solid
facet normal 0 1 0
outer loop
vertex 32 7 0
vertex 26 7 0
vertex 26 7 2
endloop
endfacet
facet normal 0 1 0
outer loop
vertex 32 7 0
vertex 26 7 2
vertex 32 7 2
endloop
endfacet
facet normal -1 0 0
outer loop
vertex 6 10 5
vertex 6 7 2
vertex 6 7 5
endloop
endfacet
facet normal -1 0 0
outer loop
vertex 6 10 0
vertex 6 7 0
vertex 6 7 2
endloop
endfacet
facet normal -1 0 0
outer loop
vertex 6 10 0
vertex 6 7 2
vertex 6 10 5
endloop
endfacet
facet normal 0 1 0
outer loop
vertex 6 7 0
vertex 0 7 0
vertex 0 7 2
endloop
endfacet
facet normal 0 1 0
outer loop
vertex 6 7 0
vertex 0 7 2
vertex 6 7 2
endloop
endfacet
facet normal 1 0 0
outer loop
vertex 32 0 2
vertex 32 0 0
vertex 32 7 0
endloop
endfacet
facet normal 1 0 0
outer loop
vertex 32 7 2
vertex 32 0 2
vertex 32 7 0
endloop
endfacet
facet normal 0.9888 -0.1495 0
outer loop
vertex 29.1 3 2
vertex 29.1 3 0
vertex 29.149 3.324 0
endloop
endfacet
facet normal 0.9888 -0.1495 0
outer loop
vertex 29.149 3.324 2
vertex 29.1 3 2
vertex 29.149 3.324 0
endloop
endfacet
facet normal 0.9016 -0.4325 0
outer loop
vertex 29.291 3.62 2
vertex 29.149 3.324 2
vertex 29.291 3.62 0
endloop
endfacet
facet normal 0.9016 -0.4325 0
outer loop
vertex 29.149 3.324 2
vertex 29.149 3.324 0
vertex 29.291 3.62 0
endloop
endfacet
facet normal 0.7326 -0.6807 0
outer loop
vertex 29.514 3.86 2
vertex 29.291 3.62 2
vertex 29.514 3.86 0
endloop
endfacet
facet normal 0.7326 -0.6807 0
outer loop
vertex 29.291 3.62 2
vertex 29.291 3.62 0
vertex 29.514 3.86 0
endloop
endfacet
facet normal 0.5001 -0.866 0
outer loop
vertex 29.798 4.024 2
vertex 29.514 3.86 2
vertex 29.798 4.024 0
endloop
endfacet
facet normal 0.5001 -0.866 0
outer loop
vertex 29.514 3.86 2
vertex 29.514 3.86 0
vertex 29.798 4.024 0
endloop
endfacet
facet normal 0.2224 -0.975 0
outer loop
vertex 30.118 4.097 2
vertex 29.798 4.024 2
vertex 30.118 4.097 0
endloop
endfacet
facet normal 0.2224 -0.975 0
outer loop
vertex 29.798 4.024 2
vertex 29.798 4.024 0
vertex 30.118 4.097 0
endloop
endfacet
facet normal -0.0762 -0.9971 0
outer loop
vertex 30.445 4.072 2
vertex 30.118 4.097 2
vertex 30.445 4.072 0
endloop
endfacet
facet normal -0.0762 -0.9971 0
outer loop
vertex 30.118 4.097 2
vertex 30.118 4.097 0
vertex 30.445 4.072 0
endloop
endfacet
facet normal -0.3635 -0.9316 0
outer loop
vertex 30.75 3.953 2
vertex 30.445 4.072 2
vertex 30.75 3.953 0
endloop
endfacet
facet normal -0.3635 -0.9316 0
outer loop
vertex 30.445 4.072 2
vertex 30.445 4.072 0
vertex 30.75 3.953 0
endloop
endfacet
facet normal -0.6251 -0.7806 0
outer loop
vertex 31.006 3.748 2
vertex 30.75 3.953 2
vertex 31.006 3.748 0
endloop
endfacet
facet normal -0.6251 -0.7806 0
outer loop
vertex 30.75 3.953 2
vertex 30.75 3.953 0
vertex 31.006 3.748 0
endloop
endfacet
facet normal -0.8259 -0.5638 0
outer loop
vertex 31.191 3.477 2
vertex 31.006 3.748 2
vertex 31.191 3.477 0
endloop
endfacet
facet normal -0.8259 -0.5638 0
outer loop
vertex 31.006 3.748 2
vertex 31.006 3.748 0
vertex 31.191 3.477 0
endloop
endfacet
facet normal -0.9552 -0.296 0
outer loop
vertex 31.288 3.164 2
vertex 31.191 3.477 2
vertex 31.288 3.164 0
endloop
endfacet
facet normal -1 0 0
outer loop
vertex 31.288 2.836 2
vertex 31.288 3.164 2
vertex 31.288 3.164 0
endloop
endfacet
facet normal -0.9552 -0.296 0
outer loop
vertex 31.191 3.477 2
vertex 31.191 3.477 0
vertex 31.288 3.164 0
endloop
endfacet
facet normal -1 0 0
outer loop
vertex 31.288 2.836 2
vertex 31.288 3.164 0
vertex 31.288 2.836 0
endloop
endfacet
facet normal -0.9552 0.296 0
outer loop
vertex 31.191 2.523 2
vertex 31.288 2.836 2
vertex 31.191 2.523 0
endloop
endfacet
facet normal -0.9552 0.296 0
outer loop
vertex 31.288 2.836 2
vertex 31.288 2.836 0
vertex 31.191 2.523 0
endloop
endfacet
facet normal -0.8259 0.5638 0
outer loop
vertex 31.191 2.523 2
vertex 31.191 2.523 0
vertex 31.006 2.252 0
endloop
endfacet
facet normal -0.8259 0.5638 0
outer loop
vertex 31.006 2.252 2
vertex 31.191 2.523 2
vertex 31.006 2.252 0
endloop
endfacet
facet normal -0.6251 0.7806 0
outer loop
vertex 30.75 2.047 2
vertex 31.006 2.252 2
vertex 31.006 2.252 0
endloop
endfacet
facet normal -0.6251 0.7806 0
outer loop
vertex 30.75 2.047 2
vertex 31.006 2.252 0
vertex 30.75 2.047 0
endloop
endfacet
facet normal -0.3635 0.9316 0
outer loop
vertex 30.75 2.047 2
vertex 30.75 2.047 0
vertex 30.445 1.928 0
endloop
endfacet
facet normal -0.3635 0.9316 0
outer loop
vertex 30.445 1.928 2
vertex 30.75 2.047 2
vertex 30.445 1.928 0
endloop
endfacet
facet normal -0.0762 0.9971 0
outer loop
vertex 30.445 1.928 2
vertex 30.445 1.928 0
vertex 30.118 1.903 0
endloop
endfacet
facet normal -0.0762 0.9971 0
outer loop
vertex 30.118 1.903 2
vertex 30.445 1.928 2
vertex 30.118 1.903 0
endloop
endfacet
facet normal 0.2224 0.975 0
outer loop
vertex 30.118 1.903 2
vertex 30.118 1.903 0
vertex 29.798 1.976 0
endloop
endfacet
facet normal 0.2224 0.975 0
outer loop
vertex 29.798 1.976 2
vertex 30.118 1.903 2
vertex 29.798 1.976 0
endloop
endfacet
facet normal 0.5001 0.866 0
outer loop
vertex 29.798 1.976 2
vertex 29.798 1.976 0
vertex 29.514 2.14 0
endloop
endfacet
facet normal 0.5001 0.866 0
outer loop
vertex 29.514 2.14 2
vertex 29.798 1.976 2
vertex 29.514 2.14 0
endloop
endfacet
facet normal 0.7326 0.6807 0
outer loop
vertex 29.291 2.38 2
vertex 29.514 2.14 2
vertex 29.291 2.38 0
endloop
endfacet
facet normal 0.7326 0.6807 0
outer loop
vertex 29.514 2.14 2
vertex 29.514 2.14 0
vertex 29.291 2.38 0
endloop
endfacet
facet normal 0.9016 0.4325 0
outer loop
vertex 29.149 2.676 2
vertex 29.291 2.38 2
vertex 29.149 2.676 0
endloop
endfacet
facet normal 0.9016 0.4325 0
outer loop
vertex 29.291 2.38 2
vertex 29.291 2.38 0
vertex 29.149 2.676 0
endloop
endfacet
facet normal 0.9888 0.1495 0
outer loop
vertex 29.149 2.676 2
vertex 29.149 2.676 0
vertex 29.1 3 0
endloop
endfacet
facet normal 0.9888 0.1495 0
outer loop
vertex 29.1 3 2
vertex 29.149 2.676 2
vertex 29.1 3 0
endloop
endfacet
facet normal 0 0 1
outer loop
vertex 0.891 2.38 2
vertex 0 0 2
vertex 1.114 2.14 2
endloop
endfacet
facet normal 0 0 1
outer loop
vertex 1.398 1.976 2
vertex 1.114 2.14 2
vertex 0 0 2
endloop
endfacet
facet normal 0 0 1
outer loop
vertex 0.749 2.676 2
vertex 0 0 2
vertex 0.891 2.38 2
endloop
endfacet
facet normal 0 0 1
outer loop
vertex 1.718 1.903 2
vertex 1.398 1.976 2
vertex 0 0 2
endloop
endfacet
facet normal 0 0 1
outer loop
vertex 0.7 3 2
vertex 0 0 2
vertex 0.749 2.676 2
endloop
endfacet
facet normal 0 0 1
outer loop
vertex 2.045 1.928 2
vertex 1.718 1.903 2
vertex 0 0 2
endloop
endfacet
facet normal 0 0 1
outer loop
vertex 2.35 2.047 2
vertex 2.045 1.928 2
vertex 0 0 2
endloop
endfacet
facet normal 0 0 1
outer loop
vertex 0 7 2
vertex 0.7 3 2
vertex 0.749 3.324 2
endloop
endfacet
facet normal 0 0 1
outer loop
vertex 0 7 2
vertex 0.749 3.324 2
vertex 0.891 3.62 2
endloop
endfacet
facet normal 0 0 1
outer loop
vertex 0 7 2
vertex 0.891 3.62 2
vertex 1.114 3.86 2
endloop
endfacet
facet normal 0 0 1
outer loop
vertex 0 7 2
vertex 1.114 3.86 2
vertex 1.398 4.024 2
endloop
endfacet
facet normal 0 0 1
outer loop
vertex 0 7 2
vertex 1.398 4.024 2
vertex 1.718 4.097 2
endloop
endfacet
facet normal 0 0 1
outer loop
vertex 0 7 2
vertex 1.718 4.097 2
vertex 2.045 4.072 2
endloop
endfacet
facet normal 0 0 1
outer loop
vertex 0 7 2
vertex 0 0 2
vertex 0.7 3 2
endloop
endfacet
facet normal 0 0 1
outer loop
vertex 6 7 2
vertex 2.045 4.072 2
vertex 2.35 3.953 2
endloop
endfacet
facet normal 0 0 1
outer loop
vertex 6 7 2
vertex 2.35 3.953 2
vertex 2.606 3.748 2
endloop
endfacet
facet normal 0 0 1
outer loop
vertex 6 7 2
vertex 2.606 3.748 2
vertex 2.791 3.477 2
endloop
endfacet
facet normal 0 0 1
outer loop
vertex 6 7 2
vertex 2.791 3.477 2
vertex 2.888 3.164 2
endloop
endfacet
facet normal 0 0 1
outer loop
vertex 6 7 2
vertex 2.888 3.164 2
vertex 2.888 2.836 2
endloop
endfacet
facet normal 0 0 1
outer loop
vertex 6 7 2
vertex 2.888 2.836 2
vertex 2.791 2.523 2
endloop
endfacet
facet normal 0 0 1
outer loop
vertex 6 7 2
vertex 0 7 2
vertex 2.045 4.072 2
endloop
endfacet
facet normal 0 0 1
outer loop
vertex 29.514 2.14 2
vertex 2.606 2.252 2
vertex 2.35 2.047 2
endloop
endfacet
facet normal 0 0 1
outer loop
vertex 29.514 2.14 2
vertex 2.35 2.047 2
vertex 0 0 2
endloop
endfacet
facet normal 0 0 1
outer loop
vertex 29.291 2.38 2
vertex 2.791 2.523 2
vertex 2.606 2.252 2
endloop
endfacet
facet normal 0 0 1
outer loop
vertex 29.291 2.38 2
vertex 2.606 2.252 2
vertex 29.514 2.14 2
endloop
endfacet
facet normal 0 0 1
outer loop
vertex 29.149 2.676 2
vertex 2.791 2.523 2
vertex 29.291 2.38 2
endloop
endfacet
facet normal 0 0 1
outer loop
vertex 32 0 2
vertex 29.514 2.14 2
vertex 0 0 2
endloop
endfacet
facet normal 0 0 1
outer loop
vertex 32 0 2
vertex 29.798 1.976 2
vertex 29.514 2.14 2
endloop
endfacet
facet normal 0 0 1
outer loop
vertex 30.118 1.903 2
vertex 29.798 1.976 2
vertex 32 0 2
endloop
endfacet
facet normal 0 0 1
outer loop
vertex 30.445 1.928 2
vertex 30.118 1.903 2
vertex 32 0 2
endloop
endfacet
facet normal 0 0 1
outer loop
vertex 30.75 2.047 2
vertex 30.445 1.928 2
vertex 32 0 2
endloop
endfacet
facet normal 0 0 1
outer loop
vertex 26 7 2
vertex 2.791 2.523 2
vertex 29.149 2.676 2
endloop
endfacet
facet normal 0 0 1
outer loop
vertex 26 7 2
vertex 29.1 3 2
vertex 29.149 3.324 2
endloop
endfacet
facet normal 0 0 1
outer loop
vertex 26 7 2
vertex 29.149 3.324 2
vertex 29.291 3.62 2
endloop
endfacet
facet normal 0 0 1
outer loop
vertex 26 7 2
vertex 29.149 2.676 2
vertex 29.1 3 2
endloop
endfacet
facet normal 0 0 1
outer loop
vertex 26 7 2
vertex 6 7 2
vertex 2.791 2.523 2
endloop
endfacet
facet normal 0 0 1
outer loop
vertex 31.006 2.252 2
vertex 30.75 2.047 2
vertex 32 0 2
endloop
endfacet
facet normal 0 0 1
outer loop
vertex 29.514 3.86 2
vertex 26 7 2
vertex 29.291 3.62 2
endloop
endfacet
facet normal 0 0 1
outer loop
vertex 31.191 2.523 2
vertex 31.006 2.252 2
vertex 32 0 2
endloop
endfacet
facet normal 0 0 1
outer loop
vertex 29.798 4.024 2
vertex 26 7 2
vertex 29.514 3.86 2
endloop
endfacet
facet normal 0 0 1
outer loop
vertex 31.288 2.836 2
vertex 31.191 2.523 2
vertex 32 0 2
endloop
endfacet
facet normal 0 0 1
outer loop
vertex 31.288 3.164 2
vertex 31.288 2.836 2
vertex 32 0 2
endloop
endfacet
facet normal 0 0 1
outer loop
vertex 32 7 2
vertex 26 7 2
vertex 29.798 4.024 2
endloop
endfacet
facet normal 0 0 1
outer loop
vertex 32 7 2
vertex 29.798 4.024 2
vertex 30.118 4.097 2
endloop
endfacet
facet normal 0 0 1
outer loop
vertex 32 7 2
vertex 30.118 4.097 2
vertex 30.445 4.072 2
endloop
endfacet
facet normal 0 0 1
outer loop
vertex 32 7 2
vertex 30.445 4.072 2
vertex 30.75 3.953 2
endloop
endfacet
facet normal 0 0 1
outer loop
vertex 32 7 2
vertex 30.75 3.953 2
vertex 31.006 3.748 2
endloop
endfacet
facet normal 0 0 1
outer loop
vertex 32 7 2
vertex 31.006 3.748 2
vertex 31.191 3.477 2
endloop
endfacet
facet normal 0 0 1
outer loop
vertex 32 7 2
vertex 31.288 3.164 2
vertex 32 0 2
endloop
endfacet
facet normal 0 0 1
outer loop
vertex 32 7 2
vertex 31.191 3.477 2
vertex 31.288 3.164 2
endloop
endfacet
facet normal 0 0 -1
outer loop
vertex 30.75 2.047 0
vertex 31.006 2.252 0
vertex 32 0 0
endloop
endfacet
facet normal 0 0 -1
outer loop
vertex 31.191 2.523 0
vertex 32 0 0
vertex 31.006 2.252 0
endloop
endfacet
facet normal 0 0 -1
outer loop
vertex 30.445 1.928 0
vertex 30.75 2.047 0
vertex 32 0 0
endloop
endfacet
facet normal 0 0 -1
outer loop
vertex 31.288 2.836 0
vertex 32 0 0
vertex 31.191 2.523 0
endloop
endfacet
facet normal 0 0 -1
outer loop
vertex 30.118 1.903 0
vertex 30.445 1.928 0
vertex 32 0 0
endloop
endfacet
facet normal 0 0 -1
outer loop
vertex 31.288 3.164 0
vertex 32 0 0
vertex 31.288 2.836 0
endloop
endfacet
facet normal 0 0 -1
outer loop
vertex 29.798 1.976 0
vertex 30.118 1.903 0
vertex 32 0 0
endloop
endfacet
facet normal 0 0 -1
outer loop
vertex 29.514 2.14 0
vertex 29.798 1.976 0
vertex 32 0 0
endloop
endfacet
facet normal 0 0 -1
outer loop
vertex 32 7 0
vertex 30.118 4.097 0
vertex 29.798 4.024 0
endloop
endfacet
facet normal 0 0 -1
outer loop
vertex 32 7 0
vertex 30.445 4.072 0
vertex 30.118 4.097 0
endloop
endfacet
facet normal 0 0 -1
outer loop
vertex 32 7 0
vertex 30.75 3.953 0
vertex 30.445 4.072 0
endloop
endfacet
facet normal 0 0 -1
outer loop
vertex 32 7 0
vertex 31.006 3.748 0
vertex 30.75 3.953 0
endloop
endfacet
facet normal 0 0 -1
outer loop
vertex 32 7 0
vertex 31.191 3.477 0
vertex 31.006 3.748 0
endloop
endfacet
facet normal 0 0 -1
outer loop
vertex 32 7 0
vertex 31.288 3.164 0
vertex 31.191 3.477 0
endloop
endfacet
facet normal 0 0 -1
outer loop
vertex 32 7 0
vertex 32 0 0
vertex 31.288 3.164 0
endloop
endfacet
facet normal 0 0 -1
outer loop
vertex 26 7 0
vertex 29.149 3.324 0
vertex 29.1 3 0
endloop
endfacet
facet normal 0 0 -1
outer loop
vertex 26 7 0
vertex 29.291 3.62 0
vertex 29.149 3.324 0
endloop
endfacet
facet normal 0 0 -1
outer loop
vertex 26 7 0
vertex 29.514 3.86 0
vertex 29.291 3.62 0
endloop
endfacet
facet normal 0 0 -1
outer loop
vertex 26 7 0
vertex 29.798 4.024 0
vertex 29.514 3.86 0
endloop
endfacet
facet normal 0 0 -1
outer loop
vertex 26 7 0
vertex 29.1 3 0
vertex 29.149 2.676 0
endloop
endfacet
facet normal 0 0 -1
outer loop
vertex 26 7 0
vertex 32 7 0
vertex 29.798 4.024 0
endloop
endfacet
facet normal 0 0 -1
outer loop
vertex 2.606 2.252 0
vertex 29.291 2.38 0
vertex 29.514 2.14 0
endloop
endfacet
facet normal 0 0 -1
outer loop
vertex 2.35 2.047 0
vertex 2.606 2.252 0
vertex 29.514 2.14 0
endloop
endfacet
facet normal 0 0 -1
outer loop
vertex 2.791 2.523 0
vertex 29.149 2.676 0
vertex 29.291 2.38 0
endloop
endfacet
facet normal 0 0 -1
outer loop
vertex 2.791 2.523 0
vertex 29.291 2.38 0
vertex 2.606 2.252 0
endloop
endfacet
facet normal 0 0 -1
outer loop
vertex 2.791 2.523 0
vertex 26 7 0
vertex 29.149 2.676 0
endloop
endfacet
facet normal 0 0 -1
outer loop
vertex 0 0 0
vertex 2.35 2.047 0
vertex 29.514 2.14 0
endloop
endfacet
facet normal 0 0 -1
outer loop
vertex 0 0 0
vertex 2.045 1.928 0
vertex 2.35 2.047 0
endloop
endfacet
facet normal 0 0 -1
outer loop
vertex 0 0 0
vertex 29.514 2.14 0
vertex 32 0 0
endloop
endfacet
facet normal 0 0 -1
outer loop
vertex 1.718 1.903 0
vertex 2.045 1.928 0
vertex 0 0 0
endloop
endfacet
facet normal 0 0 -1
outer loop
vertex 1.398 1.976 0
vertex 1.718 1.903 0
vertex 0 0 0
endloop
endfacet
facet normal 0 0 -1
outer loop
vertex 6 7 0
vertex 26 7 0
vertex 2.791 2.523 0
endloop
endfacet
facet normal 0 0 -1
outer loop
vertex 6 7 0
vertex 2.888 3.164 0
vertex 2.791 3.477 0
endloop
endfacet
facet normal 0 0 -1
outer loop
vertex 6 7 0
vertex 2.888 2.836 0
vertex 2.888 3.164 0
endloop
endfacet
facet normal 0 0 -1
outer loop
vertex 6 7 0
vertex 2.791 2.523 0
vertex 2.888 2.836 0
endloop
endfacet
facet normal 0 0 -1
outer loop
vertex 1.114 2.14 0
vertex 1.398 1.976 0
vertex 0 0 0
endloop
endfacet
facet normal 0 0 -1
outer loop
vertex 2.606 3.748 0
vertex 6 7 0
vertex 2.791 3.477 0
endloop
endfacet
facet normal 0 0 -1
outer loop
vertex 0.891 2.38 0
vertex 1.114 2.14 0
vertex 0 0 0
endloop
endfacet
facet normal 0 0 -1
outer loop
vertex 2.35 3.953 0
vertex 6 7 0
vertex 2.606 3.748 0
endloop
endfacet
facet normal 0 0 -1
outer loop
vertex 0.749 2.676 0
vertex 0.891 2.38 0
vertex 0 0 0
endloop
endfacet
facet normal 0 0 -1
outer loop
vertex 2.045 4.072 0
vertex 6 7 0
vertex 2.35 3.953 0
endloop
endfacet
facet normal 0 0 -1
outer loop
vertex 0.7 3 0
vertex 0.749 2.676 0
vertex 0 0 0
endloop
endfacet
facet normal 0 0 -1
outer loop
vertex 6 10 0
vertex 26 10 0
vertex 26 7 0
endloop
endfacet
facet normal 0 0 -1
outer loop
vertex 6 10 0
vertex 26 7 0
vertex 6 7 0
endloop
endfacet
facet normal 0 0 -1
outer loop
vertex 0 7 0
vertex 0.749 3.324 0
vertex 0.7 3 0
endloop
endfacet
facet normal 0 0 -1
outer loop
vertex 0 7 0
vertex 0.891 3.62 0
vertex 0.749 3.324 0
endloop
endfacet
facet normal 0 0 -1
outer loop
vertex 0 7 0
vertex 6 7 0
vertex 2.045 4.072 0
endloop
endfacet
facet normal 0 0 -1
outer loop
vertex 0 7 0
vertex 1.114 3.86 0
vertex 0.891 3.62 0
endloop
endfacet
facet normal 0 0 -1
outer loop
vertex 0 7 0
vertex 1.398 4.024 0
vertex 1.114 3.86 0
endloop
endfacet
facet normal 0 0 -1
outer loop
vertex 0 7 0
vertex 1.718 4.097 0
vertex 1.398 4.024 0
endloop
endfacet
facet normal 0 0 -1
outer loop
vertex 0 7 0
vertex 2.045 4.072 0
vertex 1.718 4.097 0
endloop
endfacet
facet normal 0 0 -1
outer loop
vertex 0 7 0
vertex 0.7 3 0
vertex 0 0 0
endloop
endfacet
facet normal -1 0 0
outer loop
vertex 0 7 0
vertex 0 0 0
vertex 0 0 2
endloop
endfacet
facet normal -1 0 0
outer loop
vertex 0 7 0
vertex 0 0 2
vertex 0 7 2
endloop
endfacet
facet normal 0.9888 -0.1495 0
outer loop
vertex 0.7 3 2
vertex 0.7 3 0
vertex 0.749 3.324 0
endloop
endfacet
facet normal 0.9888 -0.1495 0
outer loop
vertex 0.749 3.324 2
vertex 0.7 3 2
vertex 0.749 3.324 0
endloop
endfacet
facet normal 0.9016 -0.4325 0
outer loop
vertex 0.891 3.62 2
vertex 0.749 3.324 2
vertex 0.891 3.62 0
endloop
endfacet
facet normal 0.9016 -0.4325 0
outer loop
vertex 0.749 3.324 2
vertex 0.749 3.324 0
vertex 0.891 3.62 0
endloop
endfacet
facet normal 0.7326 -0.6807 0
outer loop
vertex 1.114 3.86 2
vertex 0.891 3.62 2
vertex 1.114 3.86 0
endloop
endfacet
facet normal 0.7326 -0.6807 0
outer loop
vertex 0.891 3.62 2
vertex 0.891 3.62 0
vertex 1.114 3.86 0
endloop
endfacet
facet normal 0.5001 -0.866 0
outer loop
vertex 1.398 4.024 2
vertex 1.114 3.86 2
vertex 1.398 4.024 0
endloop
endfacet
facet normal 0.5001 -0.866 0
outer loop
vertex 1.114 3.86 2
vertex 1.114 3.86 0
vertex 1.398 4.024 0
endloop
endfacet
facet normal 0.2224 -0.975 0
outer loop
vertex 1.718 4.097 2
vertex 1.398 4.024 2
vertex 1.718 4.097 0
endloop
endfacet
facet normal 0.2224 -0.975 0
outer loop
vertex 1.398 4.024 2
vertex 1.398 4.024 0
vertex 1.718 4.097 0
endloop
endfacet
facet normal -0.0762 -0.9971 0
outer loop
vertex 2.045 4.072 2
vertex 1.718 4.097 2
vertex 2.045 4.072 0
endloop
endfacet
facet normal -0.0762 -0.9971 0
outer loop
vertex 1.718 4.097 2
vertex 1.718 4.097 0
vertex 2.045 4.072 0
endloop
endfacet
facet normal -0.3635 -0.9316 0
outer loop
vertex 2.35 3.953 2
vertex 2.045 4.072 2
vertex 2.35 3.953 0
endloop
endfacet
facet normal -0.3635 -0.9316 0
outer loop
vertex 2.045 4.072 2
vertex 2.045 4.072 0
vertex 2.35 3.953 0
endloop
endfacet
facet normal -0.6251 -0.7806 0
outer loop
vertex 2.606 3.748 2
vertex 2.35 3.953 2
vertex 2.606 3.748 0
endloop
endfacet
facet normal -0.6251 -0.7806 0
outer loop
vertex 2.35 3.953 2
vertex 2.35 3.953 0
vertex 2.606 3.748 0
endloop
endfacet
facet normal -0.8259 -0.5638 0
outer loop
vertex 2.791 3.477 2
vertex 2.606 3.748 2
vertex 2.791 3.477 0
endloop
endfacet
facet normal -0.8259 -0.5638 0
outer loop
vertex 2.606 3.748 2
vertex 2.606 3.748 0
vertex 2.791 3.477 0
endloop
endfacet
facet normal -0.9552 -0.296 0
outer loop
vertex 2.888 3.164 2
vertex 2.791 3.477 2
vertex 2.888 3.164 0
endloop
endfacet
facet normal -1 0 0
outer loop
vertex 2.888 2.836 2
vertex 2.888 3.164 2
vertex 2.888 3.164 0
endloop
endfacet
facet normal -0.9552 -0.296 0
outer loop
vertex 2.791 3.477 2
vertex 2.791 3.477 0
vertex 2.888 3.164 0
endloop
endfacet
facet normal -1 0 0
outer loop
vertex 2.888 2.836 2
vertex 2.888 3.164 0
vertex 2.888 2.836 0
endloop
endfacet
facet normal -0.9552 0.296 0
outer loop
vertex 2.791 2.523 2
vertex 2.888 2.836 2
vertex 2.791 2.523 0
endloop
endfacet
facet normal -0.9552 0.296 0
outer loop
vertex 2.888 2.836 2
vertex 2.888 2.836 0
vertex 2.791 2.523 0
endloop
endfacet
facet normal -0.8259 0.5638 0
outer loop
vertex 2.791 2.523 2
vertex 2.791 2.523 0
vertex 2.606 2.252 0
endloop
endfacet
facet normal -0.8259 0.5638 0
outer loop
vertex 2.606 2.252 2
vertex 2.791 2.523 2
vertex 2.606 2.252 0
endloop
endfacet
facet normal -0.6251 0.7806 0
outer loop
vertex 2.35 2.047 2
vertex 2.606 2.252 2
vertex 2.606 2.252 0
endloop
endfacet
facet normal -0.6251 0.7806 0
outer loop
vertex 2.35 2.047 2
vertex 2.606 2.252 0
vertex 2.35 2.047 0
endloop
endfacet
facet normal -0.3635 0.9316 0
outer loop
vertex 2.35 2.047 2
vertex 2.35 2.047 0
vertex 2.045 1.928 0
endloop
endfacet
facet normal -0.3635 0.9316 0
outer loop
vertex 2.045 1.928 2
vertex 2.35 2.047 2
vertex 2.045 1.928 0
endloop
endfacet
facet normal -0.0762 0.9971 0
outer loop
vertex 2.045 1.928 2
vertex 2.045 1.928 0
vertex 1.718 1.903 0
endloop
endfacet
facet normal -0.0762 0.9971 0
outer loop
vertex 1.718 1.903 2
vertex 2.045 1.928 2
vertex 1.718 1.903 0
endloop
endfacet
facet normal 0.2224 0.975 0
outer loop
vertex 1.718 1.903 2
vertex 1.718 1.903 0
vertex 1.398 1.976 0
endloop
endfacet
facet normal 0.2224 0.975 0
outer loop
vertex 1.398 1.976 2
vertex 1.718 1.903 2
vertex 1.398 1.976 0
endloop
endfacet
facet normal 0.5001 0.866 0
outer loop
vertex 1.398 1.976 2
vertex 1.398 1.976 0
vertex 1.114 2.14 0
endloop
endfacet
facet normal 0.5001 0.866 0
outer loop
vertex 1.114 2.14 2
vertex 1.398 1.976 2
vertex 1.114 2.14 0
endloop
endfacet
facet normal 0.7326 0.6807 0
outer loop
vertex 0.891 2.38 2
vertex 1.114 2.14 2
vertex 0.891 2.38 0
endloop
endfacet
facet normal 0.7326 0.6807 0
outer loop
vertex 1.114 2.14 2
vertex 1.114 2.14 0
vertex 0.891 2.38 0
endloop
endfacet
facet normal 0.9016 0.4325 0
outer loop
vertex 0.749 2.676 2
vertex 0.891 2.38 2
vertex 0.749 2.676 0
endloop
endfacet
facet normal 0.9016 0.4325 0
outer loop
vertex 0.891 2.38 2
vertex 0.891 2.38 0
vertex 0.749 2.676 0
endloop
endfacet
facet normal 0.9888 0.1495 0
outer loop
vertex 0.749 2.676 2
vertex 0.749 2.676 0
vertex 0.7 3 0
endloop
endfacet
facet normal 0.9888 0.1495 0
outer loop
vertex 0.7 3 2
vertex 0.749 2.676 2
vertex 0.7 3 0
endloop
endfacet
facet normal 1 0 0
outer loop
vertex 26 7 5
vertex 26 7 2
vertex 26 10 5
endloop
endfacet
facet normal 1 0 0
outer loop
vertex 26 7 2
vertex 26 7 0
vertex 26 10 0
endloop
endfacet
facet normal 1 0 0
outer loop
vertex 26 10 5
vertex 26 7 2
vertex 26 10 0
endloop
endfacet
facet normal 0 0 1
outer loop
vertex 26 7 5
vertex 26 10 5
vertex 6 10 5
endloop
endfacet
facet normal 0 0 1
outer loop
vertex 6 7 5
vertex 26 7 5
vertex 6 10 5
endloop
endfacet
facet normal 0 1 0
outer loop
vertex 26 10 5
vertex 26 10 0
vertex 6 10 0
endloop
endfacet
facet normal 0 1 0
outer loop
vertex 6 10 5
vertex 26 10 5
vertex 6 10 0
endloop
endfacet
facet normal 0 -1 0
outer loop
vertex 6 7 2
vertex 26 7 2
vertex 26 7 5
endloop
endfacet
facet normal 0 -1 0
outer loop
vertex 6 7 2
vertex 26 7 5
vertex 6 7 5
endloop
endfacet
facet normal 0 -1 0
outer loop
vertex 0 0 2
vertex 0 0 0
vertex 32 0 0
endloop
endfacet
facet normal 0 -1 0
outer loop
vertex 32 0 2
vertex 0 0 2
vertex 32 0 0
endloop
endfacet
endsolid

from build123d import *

# Parameters (mm, degrees)
SKETCH_1_W          = 32
SKETCH_1_H          = 7
EXTRUDE_1_DEPTH     = 2
SKETCH_2_R          = 1.1
CUT_EXTRUDE_1_DEPTH = 2
SKETCH_3_W          = 20
SKETCH_3_H          = 3
EXTRUDE_2_DEPTH     = 5


with BuildPart() as part:
    # 草图1 → 凸台-拉伸1 (new body)
    with BuildSketch(Plane.XY):
        with Locations((16, 3.5)):
            Rectangle(SKETCH_1_W, SKETCH_1_H)
    extrude(amount=EXTRUDE_1_DEPTH)

    # 草图2 → 切除-拉伸1 (cut)
    with BuildSketch(Plane(origin=(0, 0, 0), x_dir=(-1, 0, 0), z_dir=(0, 0, -1))):
        with Locations((-30.2, 3)):
            Circle(SKETCH_2_R)
        with Locations((-1.8, 3)):
            Circle(SKETCH_2_R)
    extrude(amount=-CUT_EXTRUDE_1_DEPTH, mode=Mode.SUBTRACT)

    # 草图3 → 凸台-拉伸2 (add)
    with BuildSketch(Plane(origin=(0, 0, 0), x_dir=(-1, 0, 0), z_dir=(0, 0, -1))):
        with Locations((-16, 8.5)):
            Rectangle(SKETCH_3_W, SKETCH_3_H)
    extrude(amount=-EXTRUDE_2_DEPTH)


solid = part.part
